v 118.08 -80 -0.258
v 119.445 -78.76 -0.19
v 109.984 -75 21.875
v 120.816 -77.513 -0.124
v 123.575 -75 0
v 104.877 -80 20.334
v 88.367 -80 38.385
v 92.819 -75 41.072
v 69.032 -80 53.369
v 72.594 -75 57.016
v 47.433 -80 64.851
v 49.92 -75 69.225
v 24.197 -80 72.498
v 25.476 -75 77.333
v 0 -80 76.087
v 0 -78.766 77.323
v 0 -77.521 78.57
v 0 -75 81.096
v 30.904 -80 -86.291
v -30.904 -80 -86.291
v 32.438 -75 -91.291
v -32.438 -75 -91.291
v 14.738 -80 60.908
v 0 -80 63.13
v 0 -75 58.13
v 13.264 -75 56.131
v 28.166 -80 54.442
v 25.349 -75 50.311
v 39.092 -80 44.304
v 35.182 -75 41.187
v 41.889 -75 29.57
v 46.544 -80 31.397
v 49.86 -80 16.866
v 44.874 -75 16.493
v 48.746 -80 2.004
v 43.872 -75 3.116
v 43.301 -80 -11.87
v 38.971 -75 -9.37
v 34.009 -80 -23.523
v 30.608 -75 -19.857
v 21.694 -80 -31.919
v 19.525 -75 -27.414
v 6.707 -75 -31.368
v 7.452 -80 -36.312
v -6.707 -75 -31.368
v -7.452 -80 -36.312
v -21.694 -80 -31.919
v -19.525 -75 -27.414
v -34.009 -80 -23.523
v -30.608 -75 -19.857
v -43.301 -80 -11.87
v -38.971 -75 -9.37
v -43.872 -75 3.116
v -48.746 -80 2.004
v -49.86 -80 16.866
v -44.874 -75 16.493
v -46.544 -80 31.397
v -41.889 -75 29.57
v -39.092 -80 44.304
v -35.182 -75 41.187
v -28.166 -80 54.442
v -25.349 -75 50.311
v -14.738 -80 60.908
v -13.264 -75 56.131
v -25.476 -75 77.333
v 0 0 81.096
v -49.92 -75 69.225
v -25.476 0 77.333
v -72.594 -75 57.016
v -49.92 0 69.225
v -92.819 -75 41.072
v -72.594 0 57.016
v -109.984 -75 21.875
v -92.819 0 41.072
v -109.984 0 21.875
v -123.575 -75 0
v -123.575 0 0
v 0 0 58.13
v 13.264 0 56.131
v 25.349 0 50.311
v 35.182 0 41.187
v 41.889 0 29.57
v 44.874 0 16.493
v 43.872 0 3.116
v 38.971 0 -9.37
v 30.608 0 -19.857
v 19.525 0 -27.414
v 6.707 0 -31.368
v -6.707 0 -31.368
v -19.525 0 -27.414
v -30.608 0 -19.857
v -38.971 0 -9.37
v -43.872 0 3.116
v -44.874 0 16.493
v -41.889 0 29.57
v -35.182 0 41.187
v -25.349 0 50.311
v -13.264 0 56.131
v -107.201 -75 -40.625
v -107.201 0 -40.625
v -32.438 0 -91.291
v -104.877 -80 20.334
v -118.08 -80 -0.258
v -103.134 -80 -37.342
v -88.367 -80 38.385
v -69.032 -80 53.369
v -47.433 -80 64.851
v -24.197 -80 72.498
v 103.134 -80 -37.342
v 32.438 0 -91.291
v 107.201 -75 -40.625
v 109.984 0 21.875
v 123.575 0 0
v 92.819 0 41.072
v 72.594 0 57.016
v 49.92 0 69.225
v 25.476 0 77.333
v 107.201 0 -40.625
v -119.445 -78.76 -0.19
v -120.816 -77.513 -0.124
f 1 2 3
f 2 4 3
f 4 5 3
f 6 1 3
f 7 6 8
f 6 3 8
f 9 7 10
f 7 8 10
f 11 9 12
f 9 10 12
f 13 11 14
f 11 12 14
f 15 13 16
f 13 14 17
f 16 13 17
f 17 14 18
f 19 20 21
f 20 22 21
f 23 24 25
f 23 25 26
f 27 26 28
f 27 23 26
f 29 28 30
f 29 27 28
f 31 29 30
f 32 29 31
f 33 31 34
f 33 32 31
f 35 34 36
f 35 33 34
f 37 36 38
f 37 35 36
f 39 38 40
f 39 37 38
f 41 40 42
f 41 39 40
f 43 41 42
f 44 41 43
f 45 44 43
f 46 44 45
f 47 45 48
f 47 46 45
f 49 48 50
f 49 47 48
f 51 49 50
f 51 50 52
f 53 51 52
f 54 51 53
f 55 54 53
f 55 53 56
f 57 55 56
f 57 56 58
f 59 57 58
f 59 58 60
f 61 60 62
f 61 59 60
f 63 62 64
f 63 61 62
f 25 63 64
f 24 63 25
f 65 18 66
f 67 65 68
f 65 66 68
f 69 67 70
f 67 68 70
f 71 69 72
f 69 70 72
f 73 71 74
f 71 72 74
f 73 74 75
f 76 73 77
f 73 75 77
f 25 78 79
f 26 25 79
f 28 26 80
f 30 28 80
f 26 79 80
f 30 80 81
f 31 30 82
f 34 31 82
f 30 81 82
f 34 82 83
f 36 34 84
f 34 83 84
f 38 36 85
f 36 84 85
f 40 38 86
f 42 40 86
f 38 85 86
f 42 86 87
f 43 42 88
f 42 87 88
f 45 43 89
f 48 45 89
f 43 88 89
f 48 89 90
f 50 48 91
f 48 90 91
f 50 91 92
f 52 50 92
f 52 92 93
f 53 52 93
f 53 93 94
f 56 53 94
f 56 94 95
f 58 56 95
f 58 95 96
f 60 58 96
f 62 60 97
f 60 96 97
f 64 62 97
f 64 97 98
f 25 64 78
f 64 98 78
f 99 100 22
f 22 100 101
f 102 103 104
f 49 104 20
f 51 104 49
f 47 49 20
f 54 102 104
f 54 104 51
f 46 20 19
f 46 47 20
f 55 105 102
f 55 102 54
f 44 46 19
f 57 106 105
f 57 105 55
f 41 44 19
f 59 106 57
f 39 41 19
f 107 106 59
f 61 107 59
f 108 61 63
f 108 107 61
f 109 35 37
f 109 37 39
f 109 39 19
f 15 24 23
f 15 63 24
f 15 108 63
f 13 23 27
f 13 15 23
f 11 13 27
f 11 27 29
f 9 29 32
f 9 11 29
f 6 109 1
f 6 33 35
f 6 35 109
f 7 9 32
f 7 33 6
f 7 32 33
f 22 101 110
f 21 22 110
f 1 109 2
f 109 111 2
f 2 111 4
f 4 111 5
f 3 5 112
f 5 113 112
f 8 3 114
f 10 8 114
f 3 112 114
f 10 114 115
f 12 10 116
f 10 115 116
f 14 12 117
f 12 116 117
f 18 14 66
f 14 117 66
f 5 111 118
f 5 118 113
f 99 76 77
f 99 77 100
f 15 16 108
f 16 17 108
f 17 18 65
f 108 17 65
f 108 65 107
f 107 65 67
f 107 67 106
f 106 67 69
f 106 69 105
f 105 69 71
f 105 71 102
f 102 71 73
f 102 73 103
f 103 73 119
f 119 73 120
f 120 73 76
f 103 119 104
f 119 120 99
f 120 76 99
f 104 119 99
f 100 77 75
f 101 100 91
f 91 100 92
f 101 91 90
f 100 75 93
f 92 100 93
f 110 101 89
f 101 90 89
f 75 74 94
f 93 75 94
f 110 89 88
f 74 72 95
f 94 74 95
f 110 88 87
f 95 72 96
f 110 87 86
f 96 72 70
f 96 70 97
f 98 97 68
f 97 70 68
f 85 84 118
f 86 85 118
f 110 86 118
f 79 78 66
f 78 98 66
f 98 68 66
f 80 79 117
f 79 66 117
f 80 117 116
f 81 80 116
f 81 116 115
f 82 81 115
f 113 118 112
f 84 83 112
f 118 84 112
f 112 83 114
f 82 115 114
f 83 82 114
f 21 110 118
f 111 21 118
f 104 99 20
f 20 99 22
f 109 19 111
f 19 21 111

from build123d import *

# Parameters (mm, degrees)
F1_DEPTH   = 80
F2_C1_SIZE = 5
F2_C2_SIZE = 5
F2_C3_SIZE = 5
F2_C4_SIZE = 5
F2_C5_SIZE = 5
F2_C6_SIZE = 5
F2_C7_SIZE = 5
F2_C8_SIZE = 5


with BuildPart() as f1:
    # F0 (on Front) → F1 (new body)
    with BuildSketch(Plane.XZ):
        with BuildLine():
            Line((0, 58.1298414463), (0, 81.0960731047))
            ThreePointArc((0, 81.0960731047), (-72.594350102, 57.0156445727), (-123.5749638583, 0))
            Line((-123.5749638583, 0), (-107.2012897506, -40.625271212))
            Line((-107.2012897506, -40.625271212), (-32.4384310855, -91.2910051649))
            Line((-32.4384310855, -91.2910051649), (0, -91.2910051649))
            Line((0, -91.2910051649), (0, -31.8701585537))
            ThreePointArc((0, -31.8701585537), (-45, 13.1298414463), (0, 58.1298414463))
        make_face()
        with BuildLine():
            ThreePointArc((123.5749638583, 0), (72.594350102, 57.0156445727), (0, 81.0960731047))
            Line((0, 81.0960731047), (0, 58.1298414463))
            ThreePointArc((0, 58.1298414463), (31.8198051534, 44.9496465997), (45, 13.1298414463))
            ThreePointArc((45, 13.1298414463), (31.8198051534, -18.6899637071), (0, -31.8701585537))
            Line((0, -31.8701585537), (0, -91.2910051649))
            Line((0, -91.2910051649), (32.4384310855, -91.2910051649))
            Line((32.4384310855, -91.2910051649), (107.2012897506, -40.625271212))
            Line((107.2012897506, -40.625271212), (123.5749638583, 0))
        make_face()
    extrude(amount=F1_DEPTH)

    # F2: chamfer of 5 on 8 edges, made by hand

    # F2_c1
    f2_c1_edges = [f1.edges().sort_by_distance(p)[0] for p in [
        (0, -80, -31.8701585537),
    ]]
    chamfer(f2_c1_edges, length=F2_C1_SIZE)

    # F2_c2
    f2_c2_edges = [f1.edges().sort_by_distance(p)[0] for p in [
        (-72.594350102, -80, 57.0156445727),
    ]]
    chamfer(f2_c2_edges, length=F2_C2_SIZE)

    # F2_c3
    f2_c3_edges = [f1.edges().sort_by_distance(p)[0] for p in [
        (-114.129610425, -80, -23.4351827451),
    ]]
    chamfer(f2_c3_edges, length=F2_C3_SIZE)

    # F2_c4
    f2_c4_edges = [f1.edges().sort_by_distance(p)[0] for p in [
        (-66.1115818198, -80, -68.4711862478),
    ]]
    chamfer(f2_c4_edges, length=F2_C4_SIZE)

    # F2_c5
    f2_c5_edges = [f1.edges().sort_by_distance(p)[0] for p in [
        (4.4563329797, -80, -91.2910051649),
    ]]
    chamfer(f2_c5_edges, length=F2_C5_SIZE)

    # F2_c6
    f2_c6_edges = [f1.edges().sort_by_distance(p)[0] for p in [
        (73.5088851707, -80, -63.4581381884),
    ]]
    chamfer(f2_c6_edges, length=F2_C6_SIZE)

    # F2_c7
    f2_c7_edges = [f1.edges().sort_by_distance(p)[0] for p in [
        (117.0626938618, -80, -16.1578111957),
    ]]
    chamfer(f2_c7_edges, length=F2_C7_SIZE)

    # F2_c8
    f2_c8_edges = [f1.edges().sort_by_distance(p)[0] for p in [
        (86.848352424, -80, 46.3883216842),
    ]]
    chamfer(f2_c8_edges, length=F2_C8_SIZE)


solid = f1.part
